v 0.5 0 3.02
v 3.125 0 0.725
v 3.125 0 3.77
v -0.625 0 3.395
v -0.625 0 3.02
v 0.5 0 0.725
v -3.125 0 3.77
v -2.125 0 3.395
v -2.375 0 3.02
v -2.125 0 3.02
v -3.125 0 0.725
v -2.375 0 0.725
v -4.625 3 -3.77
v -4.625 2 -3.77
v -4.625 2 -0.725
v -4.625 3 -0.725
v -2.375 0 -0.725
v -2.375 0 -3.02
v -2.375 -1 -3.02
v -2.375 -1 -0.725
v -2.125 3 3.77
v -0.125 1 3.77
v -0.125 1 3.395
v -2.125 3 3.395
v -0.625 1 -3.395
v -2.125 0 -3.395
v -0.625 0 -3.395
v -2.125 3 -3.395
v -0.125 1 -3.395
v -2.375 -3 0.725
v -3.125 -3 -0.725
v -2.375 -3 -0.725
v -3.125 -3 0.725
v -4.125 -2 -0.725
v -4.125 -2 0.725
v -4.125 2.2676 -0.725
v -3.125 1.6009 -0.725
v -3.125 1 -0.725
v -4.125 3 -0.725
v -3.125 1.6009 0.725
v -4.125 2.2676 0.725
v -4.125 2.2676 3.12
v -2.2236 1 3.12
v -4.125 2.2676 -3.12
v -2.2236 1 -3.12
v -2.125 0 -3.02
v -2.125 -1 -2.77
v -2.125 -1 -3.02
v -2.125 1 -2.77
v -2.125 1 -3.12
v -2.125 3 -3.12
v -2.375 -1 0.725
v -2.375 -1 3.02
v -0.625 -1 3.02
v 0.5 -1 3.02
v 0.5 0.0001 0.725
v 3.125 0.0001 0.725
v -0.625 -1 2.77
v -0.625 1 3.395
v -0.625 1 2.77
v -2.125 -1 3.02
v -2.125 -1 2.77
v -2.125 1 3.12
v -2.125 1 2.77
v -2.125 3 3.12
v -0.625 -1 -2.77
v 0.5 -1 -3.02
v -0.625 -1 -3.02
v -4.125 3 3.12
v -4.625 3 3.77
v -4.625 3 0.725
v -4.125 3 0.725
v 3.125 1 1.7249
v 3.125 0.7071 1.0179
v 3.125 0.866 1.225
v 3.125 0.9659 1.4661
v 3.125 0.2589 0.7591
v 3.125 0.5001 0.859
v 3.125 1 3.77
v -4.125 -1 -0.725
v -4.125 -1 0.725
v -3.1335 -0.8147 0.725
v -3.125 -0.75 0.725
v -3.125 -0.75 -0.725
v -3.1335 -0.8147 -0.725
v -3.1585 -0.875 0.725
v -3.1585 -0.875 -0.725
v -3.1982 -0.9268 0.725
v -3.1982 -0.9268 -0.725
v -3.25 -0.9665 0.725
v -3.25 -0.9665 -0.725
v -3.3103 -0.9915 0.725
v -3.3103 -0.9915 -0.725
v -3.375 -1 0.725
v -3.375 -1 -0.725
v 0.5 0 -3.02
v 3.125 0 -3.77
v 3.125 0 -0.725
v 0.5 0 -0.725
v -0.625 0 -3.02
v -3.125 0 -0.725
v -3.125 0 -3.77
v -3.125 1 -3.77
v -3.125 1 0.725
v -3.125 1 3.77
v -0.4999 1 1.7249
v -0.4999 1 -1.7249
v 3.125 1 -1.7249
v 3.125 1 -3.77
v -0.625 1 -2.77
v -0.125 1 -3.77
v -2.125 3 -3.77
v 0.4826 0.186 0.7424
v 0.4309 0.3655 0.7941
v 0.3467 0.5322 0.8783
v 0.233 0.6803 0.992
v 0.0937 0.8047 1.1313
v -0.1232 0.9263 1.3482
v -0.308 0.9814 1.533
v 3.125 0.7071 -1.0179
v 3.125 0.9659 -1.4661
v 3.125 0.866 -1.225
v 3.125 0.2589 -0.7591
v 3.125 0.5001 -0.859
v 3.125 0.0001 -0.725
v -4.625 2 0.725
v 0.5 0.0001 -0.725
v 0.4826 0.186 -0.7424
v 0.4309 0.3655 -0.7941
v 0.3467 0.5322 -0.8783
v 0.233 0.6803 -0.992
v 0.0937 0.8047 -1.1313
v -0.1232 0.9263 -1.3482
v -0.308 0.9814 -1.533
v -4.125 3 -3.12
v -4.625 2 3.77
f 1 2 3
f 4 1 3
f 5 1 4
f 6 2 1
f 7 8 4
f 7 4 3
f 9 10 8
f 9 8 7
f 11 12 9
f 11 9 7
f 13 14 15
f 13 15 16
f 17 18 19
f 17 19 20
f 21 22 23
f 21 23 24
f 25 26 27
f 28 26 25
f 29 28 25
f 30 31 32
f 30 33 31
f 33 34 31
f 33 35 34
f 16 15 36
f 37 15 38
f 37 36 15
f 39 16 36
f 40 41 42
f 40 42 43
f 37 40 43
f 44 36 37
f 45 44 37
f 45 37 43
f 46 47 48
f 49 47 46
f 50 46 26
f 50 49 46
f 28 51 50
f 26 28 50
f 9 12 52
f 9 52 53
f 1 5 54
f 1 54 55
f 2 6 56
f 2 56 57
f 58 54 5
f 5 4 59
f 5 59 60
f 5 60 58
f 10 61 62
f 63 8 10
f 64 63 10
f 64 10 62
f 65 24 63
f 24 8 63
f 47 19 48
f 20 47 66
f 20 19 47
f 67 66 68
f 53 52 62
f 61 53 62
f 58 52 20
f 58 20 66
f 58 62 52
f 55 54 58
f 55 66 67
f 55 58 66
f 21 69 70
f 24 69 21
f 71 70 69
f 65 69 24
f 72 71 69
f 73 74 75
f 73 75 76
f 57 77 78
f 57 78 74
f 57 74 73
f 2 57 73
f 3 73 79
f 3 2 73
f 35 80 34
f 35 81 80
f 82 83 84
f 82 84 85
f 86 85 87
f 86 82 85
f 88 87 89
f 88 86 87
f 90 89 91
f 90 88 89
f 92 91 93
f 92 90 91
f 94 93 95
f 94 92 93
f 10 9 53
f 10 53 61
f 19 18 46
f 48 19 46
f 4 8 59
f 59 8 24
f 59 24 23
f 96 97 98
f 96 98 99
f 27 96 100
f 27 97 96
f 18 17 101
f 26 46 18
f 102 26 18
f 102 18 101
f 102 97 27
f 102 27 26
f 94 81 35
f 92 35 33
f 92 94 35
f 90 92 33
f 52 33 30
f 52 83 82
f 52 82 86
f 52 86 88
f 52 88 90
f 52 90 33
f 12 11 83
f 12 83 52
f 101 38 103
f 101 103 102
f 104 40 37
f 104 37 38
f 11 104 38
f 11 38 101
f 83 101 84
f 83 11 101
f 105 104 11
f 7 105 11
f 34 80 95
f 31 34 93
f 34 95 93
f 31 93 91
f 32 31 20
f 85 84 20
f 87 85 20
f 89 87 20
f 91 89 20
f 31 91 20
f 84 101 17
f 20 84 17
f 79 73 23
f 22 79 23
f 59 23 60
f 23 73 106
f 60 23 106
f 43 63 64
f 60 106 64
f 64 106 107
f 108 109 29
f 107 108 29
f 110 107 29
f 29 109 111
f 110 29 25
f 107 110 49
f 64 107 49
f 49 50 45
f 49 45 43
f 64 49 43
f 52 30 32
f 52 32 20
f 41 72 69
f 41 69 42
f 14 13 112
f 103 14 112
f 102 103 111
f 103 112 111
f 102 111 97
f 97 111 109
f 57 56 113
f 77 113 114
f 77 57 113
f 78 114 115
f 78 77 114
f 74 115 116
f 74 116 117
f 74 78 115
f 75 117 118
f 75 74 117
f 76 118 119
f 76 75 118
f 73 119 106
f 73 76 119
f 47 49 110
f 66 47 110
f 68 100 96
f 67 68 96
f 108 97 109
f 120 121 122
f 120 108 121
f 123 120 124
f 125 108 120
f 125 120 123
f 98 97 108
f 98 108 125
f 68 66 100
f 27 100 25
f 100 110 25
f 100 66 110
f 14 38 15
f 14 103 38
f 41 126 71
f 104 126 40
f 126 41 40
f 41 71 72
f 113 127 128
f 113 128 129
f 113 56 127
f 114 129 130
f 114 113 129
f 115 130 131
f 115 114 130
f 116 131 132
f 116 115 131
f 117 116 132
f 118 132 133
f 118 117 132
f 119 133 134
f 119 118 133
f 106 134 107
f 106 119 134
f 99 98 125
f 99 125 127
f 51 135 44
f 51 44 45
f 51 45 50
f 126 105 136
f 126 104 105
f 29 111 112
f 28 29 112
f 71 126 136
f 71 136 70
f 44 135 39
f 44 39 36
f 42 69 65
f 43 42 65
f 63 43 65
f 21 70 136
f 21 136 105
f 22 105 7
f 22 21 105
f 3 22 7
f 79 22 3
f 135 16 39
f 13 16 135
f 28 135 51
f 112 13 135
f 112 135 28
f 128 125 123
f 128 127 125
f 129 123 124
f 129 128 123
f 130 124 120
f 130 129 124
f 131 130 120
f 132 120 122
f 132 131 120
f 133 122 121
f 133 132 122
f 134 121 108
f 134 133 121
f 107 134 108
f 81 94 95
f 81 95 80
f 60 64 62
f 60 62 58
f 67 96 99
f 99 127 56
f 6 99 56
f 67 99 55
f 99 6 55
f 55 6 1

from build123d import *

# Parameters (mm, degrees)
BASE_DEPTH               = 1
SLOT_GUIDE_FILLET_1MM_R  = 1
SIDE_WALL_1_DEPTH        = 0.65
WALL_LINK_DEPTH          = 6.24
SKETCH4_W                = 2.875
SKETCH4_H                = 6.04
LOWER_FIT_DEPTH          = 1
CUT_THROUGH_REACH        = 9.184
SKETCH5_W                = 1.5
SKETCH5_H                = 1.45
SKETCH5_H_2              = 0.625
SKETCH6_W                = 0.5
SKETCH6_H                = 0.275
CUT_THROUGH_FINISH_DEPTH = 2
REAR_INSERT_DEPTH        = 0.725


with BuildPart() as part:
    # Sketch1 → Base (new body)
    with BuildSketch(Plane(origin=(0, 0, 0), x_dir=(1, 0, 0), z_dir=(0, 1, 0))):
        Polygon((3.125, 3.77), (3.125, 0.725), (0.5, 0.725), (0.5, -0.725), (3.125, -0.725), (3.125, -3.77), (-3.125, -3.77), (-3.125, 3.77), align=None)
    extrude(amount=BASE_DEPTH)

    # Slot Guide Fillet (1mm)
    slot_guide_fillet_1mm_edges = [part.edges().sort_by_distance(p)[0] for p in [
        (1.8125, 1, 0.725),
        (0.5, 1, 0),
        (1.8125, 1, -0.725),
    ]]
    fillet(slot_guide_fillet_1mm_edges, radius=SLOT_GUIDE_FILLET_1MM_R - 0.0001)  # a hair under: the kernel refuses the full size

    # Sketch2 → Side Wall 1 (add)
    with BuildSketch(Plane(origin=(0, 0, -3.77), x_dir=(-1, 0, 0), z_dir=(0, 0, -1))):
        Polygon((3.125, 1), (0.125, 1), (2.125, 3), (4.625, 3), (4.625, 2), align=None)
    side_wall_1 = extrude(amount=-SIDE_WALL_1_DEPTH)

    # Side Wall 2: Side Wall 1 across plane
    add(side_wall_1.mirror(Plane.XY))

    # Sketch3 → Wall Link (add)
    with BuildSketch(Plane.XY.offset(-3.12)):
        Polygon((-3.125, 1), (-4.625, 2), (-4.625, 3), (-4.125, 3), (-4.125, 2.267591879), (-2.223612181, 1), align=None)
    extrude(amount=WALL_LINK_DEPTH)

    # Sketch4 → Lower Fit (add)
    with BuildSketch(Plane.XZ):
        with Locations((-0.9375, 0)):
            Rectangle(SKETCH4_W, SKETCH4_H)
    extrude(amount=LOWER_FIT_DEPTH)

    # Cut Through: up to this face of the body (flat: up to its plane)
    cut_through_end = Plane(part.part.faces().sort_by_distance((-0.9375, -1, 0))[0])
    # Sketch5 → Cut Through (cut, up to the picked face)
    with BuildSketch(Plane(origin=(0, 3, 0), x_dir=(1, 0, 0), z_dir=(0, 1, 0)), mode=Mode.PRIVATE) as cut_through_sk1:
        with Locations((-3.875, 0)):
            Rectangle(SKETCH5_W, SKETCH5_H)
    cut_through_tool1 = split(extrude(cut_through_sk1.sketch, amount=-CUT_THROUGH_REACH, mode=Mode.PRIVATE), bisect_by=cut_through_end, keep=Keep.BOTH, mode=Mode.PRIVATE)
    # Sketch5 → Cut Through (cut, up to the picked face)
    with BuildSketch(Plane(origin=(0, 3, 0), x_dir=(1, 0, 0), z_dir=(0, 1, 0)), mode=Mode.PRIVATE) as cut_through_sk2:
        with Locations((-1.375, -3.0825)):
            Rectangle(SKETCH5_W, SKETCH5_H_2)
    cut_through_tool2 = split(extrude(cut_through_sk2.sketch, amount=-CUT_THROUGH_REACH, mode=Mode.PRIVATE), bisect_by=cut_through_end, keep=Keep.BOTH, mode=Mode.PRIVATE)
    # Sketch5 → Cut Through (cut, up to the picked face)
    with BuildSketch(Plane(origin=(0, 3, 0), x_dir=(1, 0, 0), z_dir=(0, 1, 0)), mode=Mode.PRIVATE) as cut_through_sk3:
        with Locations((-1.375, 3.0825)):
            Rectangle(SKETCH5_W, SKETCH5_H_2)
    cut_through_tool3 = split(extrude(cut_through_sk3.sketch, amount=-CUT_THROUGH_REACH, mode=Mode.PRIVATE), bisect_by=cut_through_end, keep=Keep.BOTH, mode=Mode.PRIVATE)
    add(cut_through_tool1.solids().sort_by(Axis((-3.875, 3, 0), (0, -1, 0)))[0], mode=Mode.SUBTRACT)
    add(cut_through_tool2.solids().sort_by(Axis((-1.375, 3, 3.0825), (0, -1, 0)))[0], mode=Mode.SUBTRACT)
    add(cut_through_tool3.solids().sort_by(Axis((-1.375, 3, -3.0825), (0, -1, 0)))[0], mode=Mode.SUBTRACT)

    # Sketch6 → Cut Through Finish (cut)
    with BuildSketch(Plane(origin=(0, 1, 0), x_dir=(1, 0, 0), z_dir=(0, 1, 0))):
        with Locations((-0.375, 3.2575)):
            Rectangle(SKETCH6_W, SKETCH6_H)
        with Locations((-0.375, -3.2575)):
            Rectangle(SKETCH6_W, SKETCH6_H)
    extrude(amount=CUT_THROUGH_FINISH_DEPTH, mode=Mode.SUBTRACT)

    # Sketch7 → Rear Insert (add, symmetric)
    with BuildSketch(Plane.XY):
        with BuildLine():
            Line((-3.125, -3), (-2.375, -3))
            Line((-2.375, -3), (-2.375, -1))
            Line((-2.375, -1), (-2.375, 0))
            Line((-2.375, 0), (-3.125, 0))
            Line((-3.125, 0), (-3.125, -0.75))
            ThreePointArc((-3.125, -0.75), (-3.198223305, -0.926776695), (-3.375, -1))
            Line((-3.375, -1), (-4.125, -1))
            Line((-4.125, -1), (-4.125, -2))
            Line((-4.125, -2), (-3.125, -3))
        make_face()
    extrude(amount=REAR_INSERT_DEPTH, both=True)


solid = part.part
